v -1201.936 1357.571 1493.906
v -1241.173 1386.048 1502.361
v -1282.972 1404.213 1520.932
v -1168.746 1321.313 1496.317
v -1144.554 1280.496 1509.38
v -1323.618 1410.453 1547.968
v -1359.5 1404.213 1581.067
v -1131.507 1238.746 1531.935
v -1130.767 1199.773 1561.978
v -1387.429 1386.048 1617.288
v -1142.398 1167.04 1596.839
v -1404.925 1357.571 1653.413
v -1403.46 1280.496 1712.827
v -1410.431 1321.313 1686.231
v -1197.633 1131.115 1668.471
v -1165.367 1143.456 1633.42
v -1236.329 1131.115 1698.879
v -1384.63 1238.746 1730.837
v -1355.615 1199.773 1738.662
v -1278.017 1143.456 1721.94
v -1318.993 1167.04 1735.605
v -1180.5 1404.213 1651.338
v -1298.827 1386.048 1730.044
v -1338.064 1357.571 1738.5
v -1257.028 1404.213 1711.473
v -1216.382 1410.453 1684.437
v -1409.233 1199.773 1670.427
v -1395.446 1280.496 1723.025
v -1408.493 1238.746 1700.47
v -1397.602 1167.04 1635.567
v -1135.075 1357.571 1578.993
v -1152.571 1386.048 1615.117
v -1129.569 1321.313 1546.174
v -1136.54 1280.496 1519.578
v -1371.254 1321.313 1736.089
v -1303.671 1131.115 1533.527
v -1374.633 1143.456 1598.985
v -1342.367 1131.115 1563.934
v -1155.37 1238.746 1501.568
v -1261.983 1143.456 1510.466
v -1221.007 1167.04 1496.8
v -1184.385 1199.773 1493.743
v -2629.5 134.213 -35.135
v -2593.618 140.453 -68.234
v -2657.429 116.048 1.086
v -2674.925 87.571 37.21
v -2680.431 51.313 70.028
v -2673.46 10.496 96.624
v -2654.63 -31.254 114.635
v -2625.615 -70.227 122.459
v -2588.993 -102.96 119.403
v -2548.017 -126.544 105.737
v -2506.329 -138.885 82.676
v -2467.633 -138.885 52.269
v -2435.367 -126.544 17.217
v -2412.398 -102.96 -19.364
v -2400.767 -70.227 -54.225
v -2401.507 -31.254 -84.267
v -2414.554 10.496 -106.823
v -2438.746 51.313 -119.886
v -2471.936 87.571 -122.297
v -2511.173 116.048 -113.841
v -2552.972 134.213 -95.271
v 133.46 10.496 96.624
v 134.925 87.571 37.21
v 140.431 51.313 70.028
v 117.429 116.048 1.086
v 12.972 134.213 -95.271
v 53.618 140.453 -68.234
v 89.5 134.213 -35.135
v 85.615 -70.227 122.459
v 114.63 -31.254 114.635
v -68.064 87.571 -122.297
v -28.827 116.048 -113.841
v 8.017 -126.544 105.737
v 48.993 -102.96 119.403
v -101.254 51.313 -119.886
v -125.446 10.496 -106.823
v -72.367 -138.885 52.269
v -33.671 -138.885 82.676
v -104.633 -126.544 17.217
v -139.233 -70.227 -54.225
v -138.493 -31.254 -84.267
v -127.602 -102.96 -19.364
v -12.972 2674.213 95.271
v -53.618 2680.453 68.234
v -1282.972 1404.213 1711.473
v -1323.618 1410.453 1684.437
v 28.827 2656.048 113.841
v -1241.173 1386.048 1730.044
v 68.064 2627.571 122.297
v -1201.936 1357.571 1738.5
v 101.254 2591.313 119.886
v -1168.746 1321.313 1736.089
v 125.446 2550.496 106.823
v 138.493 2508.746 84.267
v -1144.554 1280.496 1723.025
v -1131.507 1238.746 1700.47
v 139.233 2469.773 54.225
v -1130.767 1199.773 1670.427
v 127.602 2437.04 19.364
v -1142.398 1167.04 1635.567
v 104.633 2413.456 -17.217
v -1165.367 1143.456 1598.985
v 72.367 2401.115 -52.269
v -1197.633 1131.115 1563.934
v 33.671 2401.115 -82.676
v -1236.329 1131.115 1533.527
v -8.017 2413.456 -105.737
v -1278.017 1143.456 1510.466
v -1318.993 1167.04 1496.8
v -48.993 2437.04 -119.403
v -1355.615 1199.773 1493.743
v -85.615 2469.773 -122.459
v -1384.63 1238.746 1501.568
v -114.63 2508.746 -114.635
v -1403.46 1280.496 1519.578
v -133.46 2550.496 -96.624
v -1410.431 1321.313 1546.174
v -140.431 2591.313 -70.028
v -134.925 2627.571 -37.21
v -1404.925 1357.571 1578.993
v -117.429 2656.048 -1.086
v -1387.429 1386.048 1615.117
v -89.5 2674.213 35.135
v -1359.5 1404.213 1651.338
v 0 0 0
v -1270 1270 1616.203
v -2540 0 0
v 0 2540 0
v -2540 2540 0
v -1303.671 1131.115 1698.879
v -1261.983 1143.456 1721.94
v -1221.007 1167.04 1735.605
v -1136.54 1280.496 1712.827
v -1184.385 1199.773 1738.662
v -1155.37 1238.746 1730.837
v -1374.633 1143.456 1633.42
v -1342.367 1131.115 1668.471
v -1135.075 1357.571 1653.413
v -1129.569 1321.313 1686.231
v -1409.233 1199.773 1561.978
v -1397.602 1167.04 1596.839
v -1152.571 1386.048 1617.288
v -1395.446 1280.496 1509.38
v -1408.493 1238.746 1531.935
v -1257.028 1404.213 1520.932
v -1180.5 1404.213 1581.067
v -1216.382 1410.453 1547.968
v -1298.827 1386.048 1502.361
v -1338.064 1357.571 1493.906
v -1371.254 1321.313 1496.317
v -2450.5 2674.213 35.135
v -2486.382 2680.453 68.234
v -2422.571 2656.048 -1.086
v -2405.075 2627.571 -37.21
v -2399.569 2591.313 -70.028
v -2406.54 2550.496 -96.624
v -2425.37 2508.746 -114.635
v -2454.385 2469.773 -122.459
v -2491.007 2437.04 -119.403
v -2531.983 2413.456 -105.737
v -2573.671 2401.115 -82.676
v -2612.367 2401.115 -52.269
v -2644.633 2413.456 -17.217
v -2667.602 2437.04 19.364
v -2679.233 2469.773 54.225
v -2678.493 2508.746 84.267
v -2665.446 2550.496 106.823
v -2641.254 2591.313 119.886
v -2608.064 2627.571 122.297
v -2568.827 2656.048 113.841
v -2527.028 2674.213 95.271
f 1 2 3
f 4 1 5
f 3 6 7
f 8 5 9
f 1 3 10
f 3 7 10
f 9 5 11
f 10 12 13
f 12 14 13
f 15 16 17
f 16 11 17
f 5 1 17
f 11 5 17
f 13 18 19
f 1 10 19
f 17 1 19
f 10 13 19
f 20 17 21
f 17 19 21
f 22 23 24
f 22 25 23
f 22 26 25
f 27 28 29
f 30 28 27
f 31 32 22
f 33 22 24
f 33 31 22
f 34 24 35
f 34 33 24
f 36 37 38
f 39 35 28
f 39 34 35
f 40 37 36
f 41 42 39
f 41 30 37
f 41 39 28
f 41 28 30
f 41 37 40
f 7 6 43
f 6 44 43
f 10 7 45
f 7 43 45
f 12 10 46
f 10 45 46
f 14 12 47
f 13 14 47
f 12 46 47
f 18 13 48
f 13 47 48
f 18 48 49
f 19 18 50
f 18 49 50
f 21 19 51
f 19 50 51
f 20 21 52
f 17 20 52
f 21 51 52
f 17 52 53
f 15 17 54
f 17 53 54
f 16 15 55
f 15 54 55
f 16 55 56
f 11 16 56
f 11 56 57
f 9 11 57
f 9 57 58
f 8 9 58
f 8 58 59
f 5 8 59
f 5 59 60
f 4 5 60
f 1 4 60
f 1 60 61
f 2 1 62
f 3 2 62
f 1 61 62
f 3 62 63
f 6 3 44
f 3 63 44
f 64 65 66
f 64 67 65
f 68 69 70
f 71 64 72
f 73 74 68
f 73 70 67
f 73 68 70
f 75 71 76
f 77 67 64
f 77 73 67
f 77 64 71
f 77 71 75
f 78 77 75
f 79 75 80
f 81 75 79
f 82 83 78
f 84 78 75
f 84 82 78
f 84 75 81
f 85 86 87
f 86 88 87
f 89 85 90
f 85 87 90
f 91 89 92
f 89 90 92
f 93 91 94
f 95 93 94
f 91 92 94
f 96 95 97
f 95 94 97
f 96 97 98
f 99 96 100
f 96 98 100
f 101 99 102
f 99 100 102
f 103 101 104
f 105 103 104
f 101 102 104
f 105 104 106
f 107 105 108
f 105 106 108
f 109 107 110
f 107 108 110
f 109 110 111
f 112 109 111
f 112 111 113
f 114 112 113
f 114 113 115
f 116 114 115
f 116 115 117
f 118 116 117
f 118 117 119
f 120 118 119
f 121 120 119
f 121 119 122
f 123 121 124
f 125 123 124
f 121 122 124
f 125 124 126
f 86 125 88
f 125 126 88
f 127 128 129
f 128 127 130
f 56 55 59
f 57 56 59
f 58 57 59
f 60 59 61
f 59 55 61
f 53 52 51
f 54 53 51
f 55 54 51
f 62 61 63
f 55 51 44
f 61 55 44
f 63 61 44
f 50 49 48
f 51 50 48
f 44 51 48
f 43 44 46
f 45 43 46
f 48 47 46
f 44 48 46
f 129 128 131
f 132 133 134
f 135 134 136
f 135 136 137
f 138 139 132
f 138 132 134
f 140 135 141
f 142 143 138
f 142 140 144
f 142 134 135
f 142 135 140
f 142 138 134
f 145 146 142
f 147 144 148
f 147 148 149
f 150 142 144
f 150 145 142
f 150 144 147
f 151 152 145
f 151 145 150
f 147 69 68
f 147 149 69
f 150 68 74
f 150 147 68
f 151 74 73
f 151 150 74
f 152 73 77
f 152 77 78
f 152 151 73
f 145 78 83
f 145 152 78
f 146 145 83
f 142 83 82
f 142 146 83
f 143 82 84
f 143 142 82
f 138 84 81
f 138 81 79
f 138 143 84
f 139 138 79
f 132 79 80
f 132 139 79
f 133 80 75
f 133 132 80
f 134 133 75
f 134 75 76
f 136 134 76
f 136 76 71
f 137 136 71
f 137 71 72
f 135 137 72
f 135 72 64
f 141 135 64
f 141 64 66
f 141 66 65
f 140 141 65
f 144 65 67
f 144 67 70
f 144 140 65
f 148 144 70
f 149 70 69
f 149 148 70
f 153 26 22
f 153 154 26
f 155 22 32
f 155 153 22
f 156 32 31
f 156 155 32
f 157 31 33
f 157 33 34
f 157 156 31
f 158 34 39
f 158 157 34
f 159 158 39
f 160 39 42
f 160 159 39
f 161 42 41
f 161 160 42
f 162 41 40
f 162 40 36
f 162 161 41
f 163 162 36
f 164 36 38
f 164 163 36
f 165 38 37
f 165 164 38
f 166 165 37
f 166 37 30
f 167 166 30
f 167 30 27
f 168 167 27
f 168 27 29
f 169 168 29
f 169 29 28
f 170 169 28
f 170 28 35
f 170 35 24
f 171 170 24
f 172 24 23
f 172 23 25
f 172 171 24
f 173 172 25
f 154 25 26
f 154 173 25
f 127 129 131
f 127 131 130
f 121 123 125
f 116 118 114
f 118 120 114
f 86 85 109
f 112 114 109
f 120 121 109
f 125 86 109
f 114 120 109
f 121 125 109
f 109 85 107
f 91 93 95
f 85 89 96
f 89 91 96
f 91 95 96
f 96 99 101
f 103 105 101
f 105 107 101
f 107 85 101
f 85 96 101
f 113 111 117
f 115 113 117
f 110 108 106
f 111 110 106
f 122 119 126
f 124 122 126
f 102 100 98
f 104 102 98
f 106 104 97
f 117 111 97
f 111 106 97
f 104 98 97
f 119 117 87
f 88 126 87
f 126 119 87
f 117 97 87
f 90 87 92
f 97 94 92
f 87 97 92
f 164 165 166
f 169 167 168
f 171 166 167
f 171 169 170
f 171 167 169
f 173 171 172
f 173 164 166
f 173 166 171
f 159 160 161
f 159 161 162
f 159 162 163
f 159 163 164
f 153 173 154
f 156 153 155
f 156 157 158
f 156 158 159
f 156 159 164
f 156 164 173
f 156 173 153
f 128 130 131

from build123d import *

# Parameters (mm, degrees)
F1_DEPTH = 3048
F3_DEPTH = 2794


with BuildPart() as f1:
    # F0 (on Front) → F1 (new body)
    with BuildSketch(Plane.XZ):
        Polygon((-2540, 0), (0, 0), (-1270, 1616.2025930436), align=None)
    extrude(amount=-F1_DEPTH)

    # F2 (on Right) → F3 (intersect)
    with BuildSketch(Plane.YZ):
        Polygon((1270, 1616.2025930436), (0, 0), (2540, 0), align=None)
    extrude(amount=-F3_DEPTH, mode=Mode.INTERSECT)


with BuildPart() as f5:
    # F4 (on face) → F5 (revolve)
    with BuildSketch(Plane(origin=(0, 0, 0), x_dir=(0, 1, 0), z_dir=(0.7862884321, 0, 0.6178596131))):
        Polygon((1270, 2055.4831115241), (0, 0), (140.4534003415, -86.7804835922), (1410.4534003415, 1968.7026279319), align=None)
    revolve(axis=Axis((-635, 635, 808.1012965218), (-0.5256237649, 0.5256237649, 0.6689090487)))


with BuildPart() as f7:
    # F6 (on face) → F7 (revolve)
    with BuildSketch(Plane(origin=(0, 0, 0), x_dir=(0, 1, 0), z_dir=(0.7862884321, 0, 0.6178596131))):
        Polygon((1410.4534003415, 2142.2635951163), (1270, 2055.4831115241), (2540, 0), (2680.4534003415, 86.7804835922), align=None)
    revolve(axis=Axis((-635, 1905, 808.1012965218), (0.5256237649, 0.5256237649, -0.6689090487)))


with BuildPart() as f9:
    # F8 (on face) → F9 (revolve)
    with BuildSketch(Plane(origin=(-1570.3537262201, 0, 1233.9723008016), x_dir=(0, -1, 0), z_dir=(-0.7862884321, 0, 0.6178596131))):
        Polygon((-140.4534003415, -1656.1439008417), (0, -1569.3634172494), (-1270, 486.1196942747), (-1410.4534003415, 399.3392106824), align=None)
    revolve(axis=Axis((-1905, 635, 808.1012965218), (0.5256237649, 0.5256237649, 0.6689090487)))


with BuildPart() as f11:
    # F10 (on face) → F11 (revolve)
    with BuildSketch(Plane(origin=(-1570.3537262201, 0, 1233.9723008016), x_dir=(0, -1, 0), z_dir=(-0.7862884321, 0, 0.6178596131))):
        Polygon((-2540, -1569.3634172494), (-1270, 486.1196942747), (-1410.4534003415, 572.9001778669), (-2680.4534003415, -1482.5829336572), align=None)
    revolve(axis=Axis((-1905, 1905, 808.1012965218), (-0.5256237649, 0.5256237649, -0.6689090487)))


solid = Compound([f1.part, f5.part, f7.part, f9.part, f11.part])
